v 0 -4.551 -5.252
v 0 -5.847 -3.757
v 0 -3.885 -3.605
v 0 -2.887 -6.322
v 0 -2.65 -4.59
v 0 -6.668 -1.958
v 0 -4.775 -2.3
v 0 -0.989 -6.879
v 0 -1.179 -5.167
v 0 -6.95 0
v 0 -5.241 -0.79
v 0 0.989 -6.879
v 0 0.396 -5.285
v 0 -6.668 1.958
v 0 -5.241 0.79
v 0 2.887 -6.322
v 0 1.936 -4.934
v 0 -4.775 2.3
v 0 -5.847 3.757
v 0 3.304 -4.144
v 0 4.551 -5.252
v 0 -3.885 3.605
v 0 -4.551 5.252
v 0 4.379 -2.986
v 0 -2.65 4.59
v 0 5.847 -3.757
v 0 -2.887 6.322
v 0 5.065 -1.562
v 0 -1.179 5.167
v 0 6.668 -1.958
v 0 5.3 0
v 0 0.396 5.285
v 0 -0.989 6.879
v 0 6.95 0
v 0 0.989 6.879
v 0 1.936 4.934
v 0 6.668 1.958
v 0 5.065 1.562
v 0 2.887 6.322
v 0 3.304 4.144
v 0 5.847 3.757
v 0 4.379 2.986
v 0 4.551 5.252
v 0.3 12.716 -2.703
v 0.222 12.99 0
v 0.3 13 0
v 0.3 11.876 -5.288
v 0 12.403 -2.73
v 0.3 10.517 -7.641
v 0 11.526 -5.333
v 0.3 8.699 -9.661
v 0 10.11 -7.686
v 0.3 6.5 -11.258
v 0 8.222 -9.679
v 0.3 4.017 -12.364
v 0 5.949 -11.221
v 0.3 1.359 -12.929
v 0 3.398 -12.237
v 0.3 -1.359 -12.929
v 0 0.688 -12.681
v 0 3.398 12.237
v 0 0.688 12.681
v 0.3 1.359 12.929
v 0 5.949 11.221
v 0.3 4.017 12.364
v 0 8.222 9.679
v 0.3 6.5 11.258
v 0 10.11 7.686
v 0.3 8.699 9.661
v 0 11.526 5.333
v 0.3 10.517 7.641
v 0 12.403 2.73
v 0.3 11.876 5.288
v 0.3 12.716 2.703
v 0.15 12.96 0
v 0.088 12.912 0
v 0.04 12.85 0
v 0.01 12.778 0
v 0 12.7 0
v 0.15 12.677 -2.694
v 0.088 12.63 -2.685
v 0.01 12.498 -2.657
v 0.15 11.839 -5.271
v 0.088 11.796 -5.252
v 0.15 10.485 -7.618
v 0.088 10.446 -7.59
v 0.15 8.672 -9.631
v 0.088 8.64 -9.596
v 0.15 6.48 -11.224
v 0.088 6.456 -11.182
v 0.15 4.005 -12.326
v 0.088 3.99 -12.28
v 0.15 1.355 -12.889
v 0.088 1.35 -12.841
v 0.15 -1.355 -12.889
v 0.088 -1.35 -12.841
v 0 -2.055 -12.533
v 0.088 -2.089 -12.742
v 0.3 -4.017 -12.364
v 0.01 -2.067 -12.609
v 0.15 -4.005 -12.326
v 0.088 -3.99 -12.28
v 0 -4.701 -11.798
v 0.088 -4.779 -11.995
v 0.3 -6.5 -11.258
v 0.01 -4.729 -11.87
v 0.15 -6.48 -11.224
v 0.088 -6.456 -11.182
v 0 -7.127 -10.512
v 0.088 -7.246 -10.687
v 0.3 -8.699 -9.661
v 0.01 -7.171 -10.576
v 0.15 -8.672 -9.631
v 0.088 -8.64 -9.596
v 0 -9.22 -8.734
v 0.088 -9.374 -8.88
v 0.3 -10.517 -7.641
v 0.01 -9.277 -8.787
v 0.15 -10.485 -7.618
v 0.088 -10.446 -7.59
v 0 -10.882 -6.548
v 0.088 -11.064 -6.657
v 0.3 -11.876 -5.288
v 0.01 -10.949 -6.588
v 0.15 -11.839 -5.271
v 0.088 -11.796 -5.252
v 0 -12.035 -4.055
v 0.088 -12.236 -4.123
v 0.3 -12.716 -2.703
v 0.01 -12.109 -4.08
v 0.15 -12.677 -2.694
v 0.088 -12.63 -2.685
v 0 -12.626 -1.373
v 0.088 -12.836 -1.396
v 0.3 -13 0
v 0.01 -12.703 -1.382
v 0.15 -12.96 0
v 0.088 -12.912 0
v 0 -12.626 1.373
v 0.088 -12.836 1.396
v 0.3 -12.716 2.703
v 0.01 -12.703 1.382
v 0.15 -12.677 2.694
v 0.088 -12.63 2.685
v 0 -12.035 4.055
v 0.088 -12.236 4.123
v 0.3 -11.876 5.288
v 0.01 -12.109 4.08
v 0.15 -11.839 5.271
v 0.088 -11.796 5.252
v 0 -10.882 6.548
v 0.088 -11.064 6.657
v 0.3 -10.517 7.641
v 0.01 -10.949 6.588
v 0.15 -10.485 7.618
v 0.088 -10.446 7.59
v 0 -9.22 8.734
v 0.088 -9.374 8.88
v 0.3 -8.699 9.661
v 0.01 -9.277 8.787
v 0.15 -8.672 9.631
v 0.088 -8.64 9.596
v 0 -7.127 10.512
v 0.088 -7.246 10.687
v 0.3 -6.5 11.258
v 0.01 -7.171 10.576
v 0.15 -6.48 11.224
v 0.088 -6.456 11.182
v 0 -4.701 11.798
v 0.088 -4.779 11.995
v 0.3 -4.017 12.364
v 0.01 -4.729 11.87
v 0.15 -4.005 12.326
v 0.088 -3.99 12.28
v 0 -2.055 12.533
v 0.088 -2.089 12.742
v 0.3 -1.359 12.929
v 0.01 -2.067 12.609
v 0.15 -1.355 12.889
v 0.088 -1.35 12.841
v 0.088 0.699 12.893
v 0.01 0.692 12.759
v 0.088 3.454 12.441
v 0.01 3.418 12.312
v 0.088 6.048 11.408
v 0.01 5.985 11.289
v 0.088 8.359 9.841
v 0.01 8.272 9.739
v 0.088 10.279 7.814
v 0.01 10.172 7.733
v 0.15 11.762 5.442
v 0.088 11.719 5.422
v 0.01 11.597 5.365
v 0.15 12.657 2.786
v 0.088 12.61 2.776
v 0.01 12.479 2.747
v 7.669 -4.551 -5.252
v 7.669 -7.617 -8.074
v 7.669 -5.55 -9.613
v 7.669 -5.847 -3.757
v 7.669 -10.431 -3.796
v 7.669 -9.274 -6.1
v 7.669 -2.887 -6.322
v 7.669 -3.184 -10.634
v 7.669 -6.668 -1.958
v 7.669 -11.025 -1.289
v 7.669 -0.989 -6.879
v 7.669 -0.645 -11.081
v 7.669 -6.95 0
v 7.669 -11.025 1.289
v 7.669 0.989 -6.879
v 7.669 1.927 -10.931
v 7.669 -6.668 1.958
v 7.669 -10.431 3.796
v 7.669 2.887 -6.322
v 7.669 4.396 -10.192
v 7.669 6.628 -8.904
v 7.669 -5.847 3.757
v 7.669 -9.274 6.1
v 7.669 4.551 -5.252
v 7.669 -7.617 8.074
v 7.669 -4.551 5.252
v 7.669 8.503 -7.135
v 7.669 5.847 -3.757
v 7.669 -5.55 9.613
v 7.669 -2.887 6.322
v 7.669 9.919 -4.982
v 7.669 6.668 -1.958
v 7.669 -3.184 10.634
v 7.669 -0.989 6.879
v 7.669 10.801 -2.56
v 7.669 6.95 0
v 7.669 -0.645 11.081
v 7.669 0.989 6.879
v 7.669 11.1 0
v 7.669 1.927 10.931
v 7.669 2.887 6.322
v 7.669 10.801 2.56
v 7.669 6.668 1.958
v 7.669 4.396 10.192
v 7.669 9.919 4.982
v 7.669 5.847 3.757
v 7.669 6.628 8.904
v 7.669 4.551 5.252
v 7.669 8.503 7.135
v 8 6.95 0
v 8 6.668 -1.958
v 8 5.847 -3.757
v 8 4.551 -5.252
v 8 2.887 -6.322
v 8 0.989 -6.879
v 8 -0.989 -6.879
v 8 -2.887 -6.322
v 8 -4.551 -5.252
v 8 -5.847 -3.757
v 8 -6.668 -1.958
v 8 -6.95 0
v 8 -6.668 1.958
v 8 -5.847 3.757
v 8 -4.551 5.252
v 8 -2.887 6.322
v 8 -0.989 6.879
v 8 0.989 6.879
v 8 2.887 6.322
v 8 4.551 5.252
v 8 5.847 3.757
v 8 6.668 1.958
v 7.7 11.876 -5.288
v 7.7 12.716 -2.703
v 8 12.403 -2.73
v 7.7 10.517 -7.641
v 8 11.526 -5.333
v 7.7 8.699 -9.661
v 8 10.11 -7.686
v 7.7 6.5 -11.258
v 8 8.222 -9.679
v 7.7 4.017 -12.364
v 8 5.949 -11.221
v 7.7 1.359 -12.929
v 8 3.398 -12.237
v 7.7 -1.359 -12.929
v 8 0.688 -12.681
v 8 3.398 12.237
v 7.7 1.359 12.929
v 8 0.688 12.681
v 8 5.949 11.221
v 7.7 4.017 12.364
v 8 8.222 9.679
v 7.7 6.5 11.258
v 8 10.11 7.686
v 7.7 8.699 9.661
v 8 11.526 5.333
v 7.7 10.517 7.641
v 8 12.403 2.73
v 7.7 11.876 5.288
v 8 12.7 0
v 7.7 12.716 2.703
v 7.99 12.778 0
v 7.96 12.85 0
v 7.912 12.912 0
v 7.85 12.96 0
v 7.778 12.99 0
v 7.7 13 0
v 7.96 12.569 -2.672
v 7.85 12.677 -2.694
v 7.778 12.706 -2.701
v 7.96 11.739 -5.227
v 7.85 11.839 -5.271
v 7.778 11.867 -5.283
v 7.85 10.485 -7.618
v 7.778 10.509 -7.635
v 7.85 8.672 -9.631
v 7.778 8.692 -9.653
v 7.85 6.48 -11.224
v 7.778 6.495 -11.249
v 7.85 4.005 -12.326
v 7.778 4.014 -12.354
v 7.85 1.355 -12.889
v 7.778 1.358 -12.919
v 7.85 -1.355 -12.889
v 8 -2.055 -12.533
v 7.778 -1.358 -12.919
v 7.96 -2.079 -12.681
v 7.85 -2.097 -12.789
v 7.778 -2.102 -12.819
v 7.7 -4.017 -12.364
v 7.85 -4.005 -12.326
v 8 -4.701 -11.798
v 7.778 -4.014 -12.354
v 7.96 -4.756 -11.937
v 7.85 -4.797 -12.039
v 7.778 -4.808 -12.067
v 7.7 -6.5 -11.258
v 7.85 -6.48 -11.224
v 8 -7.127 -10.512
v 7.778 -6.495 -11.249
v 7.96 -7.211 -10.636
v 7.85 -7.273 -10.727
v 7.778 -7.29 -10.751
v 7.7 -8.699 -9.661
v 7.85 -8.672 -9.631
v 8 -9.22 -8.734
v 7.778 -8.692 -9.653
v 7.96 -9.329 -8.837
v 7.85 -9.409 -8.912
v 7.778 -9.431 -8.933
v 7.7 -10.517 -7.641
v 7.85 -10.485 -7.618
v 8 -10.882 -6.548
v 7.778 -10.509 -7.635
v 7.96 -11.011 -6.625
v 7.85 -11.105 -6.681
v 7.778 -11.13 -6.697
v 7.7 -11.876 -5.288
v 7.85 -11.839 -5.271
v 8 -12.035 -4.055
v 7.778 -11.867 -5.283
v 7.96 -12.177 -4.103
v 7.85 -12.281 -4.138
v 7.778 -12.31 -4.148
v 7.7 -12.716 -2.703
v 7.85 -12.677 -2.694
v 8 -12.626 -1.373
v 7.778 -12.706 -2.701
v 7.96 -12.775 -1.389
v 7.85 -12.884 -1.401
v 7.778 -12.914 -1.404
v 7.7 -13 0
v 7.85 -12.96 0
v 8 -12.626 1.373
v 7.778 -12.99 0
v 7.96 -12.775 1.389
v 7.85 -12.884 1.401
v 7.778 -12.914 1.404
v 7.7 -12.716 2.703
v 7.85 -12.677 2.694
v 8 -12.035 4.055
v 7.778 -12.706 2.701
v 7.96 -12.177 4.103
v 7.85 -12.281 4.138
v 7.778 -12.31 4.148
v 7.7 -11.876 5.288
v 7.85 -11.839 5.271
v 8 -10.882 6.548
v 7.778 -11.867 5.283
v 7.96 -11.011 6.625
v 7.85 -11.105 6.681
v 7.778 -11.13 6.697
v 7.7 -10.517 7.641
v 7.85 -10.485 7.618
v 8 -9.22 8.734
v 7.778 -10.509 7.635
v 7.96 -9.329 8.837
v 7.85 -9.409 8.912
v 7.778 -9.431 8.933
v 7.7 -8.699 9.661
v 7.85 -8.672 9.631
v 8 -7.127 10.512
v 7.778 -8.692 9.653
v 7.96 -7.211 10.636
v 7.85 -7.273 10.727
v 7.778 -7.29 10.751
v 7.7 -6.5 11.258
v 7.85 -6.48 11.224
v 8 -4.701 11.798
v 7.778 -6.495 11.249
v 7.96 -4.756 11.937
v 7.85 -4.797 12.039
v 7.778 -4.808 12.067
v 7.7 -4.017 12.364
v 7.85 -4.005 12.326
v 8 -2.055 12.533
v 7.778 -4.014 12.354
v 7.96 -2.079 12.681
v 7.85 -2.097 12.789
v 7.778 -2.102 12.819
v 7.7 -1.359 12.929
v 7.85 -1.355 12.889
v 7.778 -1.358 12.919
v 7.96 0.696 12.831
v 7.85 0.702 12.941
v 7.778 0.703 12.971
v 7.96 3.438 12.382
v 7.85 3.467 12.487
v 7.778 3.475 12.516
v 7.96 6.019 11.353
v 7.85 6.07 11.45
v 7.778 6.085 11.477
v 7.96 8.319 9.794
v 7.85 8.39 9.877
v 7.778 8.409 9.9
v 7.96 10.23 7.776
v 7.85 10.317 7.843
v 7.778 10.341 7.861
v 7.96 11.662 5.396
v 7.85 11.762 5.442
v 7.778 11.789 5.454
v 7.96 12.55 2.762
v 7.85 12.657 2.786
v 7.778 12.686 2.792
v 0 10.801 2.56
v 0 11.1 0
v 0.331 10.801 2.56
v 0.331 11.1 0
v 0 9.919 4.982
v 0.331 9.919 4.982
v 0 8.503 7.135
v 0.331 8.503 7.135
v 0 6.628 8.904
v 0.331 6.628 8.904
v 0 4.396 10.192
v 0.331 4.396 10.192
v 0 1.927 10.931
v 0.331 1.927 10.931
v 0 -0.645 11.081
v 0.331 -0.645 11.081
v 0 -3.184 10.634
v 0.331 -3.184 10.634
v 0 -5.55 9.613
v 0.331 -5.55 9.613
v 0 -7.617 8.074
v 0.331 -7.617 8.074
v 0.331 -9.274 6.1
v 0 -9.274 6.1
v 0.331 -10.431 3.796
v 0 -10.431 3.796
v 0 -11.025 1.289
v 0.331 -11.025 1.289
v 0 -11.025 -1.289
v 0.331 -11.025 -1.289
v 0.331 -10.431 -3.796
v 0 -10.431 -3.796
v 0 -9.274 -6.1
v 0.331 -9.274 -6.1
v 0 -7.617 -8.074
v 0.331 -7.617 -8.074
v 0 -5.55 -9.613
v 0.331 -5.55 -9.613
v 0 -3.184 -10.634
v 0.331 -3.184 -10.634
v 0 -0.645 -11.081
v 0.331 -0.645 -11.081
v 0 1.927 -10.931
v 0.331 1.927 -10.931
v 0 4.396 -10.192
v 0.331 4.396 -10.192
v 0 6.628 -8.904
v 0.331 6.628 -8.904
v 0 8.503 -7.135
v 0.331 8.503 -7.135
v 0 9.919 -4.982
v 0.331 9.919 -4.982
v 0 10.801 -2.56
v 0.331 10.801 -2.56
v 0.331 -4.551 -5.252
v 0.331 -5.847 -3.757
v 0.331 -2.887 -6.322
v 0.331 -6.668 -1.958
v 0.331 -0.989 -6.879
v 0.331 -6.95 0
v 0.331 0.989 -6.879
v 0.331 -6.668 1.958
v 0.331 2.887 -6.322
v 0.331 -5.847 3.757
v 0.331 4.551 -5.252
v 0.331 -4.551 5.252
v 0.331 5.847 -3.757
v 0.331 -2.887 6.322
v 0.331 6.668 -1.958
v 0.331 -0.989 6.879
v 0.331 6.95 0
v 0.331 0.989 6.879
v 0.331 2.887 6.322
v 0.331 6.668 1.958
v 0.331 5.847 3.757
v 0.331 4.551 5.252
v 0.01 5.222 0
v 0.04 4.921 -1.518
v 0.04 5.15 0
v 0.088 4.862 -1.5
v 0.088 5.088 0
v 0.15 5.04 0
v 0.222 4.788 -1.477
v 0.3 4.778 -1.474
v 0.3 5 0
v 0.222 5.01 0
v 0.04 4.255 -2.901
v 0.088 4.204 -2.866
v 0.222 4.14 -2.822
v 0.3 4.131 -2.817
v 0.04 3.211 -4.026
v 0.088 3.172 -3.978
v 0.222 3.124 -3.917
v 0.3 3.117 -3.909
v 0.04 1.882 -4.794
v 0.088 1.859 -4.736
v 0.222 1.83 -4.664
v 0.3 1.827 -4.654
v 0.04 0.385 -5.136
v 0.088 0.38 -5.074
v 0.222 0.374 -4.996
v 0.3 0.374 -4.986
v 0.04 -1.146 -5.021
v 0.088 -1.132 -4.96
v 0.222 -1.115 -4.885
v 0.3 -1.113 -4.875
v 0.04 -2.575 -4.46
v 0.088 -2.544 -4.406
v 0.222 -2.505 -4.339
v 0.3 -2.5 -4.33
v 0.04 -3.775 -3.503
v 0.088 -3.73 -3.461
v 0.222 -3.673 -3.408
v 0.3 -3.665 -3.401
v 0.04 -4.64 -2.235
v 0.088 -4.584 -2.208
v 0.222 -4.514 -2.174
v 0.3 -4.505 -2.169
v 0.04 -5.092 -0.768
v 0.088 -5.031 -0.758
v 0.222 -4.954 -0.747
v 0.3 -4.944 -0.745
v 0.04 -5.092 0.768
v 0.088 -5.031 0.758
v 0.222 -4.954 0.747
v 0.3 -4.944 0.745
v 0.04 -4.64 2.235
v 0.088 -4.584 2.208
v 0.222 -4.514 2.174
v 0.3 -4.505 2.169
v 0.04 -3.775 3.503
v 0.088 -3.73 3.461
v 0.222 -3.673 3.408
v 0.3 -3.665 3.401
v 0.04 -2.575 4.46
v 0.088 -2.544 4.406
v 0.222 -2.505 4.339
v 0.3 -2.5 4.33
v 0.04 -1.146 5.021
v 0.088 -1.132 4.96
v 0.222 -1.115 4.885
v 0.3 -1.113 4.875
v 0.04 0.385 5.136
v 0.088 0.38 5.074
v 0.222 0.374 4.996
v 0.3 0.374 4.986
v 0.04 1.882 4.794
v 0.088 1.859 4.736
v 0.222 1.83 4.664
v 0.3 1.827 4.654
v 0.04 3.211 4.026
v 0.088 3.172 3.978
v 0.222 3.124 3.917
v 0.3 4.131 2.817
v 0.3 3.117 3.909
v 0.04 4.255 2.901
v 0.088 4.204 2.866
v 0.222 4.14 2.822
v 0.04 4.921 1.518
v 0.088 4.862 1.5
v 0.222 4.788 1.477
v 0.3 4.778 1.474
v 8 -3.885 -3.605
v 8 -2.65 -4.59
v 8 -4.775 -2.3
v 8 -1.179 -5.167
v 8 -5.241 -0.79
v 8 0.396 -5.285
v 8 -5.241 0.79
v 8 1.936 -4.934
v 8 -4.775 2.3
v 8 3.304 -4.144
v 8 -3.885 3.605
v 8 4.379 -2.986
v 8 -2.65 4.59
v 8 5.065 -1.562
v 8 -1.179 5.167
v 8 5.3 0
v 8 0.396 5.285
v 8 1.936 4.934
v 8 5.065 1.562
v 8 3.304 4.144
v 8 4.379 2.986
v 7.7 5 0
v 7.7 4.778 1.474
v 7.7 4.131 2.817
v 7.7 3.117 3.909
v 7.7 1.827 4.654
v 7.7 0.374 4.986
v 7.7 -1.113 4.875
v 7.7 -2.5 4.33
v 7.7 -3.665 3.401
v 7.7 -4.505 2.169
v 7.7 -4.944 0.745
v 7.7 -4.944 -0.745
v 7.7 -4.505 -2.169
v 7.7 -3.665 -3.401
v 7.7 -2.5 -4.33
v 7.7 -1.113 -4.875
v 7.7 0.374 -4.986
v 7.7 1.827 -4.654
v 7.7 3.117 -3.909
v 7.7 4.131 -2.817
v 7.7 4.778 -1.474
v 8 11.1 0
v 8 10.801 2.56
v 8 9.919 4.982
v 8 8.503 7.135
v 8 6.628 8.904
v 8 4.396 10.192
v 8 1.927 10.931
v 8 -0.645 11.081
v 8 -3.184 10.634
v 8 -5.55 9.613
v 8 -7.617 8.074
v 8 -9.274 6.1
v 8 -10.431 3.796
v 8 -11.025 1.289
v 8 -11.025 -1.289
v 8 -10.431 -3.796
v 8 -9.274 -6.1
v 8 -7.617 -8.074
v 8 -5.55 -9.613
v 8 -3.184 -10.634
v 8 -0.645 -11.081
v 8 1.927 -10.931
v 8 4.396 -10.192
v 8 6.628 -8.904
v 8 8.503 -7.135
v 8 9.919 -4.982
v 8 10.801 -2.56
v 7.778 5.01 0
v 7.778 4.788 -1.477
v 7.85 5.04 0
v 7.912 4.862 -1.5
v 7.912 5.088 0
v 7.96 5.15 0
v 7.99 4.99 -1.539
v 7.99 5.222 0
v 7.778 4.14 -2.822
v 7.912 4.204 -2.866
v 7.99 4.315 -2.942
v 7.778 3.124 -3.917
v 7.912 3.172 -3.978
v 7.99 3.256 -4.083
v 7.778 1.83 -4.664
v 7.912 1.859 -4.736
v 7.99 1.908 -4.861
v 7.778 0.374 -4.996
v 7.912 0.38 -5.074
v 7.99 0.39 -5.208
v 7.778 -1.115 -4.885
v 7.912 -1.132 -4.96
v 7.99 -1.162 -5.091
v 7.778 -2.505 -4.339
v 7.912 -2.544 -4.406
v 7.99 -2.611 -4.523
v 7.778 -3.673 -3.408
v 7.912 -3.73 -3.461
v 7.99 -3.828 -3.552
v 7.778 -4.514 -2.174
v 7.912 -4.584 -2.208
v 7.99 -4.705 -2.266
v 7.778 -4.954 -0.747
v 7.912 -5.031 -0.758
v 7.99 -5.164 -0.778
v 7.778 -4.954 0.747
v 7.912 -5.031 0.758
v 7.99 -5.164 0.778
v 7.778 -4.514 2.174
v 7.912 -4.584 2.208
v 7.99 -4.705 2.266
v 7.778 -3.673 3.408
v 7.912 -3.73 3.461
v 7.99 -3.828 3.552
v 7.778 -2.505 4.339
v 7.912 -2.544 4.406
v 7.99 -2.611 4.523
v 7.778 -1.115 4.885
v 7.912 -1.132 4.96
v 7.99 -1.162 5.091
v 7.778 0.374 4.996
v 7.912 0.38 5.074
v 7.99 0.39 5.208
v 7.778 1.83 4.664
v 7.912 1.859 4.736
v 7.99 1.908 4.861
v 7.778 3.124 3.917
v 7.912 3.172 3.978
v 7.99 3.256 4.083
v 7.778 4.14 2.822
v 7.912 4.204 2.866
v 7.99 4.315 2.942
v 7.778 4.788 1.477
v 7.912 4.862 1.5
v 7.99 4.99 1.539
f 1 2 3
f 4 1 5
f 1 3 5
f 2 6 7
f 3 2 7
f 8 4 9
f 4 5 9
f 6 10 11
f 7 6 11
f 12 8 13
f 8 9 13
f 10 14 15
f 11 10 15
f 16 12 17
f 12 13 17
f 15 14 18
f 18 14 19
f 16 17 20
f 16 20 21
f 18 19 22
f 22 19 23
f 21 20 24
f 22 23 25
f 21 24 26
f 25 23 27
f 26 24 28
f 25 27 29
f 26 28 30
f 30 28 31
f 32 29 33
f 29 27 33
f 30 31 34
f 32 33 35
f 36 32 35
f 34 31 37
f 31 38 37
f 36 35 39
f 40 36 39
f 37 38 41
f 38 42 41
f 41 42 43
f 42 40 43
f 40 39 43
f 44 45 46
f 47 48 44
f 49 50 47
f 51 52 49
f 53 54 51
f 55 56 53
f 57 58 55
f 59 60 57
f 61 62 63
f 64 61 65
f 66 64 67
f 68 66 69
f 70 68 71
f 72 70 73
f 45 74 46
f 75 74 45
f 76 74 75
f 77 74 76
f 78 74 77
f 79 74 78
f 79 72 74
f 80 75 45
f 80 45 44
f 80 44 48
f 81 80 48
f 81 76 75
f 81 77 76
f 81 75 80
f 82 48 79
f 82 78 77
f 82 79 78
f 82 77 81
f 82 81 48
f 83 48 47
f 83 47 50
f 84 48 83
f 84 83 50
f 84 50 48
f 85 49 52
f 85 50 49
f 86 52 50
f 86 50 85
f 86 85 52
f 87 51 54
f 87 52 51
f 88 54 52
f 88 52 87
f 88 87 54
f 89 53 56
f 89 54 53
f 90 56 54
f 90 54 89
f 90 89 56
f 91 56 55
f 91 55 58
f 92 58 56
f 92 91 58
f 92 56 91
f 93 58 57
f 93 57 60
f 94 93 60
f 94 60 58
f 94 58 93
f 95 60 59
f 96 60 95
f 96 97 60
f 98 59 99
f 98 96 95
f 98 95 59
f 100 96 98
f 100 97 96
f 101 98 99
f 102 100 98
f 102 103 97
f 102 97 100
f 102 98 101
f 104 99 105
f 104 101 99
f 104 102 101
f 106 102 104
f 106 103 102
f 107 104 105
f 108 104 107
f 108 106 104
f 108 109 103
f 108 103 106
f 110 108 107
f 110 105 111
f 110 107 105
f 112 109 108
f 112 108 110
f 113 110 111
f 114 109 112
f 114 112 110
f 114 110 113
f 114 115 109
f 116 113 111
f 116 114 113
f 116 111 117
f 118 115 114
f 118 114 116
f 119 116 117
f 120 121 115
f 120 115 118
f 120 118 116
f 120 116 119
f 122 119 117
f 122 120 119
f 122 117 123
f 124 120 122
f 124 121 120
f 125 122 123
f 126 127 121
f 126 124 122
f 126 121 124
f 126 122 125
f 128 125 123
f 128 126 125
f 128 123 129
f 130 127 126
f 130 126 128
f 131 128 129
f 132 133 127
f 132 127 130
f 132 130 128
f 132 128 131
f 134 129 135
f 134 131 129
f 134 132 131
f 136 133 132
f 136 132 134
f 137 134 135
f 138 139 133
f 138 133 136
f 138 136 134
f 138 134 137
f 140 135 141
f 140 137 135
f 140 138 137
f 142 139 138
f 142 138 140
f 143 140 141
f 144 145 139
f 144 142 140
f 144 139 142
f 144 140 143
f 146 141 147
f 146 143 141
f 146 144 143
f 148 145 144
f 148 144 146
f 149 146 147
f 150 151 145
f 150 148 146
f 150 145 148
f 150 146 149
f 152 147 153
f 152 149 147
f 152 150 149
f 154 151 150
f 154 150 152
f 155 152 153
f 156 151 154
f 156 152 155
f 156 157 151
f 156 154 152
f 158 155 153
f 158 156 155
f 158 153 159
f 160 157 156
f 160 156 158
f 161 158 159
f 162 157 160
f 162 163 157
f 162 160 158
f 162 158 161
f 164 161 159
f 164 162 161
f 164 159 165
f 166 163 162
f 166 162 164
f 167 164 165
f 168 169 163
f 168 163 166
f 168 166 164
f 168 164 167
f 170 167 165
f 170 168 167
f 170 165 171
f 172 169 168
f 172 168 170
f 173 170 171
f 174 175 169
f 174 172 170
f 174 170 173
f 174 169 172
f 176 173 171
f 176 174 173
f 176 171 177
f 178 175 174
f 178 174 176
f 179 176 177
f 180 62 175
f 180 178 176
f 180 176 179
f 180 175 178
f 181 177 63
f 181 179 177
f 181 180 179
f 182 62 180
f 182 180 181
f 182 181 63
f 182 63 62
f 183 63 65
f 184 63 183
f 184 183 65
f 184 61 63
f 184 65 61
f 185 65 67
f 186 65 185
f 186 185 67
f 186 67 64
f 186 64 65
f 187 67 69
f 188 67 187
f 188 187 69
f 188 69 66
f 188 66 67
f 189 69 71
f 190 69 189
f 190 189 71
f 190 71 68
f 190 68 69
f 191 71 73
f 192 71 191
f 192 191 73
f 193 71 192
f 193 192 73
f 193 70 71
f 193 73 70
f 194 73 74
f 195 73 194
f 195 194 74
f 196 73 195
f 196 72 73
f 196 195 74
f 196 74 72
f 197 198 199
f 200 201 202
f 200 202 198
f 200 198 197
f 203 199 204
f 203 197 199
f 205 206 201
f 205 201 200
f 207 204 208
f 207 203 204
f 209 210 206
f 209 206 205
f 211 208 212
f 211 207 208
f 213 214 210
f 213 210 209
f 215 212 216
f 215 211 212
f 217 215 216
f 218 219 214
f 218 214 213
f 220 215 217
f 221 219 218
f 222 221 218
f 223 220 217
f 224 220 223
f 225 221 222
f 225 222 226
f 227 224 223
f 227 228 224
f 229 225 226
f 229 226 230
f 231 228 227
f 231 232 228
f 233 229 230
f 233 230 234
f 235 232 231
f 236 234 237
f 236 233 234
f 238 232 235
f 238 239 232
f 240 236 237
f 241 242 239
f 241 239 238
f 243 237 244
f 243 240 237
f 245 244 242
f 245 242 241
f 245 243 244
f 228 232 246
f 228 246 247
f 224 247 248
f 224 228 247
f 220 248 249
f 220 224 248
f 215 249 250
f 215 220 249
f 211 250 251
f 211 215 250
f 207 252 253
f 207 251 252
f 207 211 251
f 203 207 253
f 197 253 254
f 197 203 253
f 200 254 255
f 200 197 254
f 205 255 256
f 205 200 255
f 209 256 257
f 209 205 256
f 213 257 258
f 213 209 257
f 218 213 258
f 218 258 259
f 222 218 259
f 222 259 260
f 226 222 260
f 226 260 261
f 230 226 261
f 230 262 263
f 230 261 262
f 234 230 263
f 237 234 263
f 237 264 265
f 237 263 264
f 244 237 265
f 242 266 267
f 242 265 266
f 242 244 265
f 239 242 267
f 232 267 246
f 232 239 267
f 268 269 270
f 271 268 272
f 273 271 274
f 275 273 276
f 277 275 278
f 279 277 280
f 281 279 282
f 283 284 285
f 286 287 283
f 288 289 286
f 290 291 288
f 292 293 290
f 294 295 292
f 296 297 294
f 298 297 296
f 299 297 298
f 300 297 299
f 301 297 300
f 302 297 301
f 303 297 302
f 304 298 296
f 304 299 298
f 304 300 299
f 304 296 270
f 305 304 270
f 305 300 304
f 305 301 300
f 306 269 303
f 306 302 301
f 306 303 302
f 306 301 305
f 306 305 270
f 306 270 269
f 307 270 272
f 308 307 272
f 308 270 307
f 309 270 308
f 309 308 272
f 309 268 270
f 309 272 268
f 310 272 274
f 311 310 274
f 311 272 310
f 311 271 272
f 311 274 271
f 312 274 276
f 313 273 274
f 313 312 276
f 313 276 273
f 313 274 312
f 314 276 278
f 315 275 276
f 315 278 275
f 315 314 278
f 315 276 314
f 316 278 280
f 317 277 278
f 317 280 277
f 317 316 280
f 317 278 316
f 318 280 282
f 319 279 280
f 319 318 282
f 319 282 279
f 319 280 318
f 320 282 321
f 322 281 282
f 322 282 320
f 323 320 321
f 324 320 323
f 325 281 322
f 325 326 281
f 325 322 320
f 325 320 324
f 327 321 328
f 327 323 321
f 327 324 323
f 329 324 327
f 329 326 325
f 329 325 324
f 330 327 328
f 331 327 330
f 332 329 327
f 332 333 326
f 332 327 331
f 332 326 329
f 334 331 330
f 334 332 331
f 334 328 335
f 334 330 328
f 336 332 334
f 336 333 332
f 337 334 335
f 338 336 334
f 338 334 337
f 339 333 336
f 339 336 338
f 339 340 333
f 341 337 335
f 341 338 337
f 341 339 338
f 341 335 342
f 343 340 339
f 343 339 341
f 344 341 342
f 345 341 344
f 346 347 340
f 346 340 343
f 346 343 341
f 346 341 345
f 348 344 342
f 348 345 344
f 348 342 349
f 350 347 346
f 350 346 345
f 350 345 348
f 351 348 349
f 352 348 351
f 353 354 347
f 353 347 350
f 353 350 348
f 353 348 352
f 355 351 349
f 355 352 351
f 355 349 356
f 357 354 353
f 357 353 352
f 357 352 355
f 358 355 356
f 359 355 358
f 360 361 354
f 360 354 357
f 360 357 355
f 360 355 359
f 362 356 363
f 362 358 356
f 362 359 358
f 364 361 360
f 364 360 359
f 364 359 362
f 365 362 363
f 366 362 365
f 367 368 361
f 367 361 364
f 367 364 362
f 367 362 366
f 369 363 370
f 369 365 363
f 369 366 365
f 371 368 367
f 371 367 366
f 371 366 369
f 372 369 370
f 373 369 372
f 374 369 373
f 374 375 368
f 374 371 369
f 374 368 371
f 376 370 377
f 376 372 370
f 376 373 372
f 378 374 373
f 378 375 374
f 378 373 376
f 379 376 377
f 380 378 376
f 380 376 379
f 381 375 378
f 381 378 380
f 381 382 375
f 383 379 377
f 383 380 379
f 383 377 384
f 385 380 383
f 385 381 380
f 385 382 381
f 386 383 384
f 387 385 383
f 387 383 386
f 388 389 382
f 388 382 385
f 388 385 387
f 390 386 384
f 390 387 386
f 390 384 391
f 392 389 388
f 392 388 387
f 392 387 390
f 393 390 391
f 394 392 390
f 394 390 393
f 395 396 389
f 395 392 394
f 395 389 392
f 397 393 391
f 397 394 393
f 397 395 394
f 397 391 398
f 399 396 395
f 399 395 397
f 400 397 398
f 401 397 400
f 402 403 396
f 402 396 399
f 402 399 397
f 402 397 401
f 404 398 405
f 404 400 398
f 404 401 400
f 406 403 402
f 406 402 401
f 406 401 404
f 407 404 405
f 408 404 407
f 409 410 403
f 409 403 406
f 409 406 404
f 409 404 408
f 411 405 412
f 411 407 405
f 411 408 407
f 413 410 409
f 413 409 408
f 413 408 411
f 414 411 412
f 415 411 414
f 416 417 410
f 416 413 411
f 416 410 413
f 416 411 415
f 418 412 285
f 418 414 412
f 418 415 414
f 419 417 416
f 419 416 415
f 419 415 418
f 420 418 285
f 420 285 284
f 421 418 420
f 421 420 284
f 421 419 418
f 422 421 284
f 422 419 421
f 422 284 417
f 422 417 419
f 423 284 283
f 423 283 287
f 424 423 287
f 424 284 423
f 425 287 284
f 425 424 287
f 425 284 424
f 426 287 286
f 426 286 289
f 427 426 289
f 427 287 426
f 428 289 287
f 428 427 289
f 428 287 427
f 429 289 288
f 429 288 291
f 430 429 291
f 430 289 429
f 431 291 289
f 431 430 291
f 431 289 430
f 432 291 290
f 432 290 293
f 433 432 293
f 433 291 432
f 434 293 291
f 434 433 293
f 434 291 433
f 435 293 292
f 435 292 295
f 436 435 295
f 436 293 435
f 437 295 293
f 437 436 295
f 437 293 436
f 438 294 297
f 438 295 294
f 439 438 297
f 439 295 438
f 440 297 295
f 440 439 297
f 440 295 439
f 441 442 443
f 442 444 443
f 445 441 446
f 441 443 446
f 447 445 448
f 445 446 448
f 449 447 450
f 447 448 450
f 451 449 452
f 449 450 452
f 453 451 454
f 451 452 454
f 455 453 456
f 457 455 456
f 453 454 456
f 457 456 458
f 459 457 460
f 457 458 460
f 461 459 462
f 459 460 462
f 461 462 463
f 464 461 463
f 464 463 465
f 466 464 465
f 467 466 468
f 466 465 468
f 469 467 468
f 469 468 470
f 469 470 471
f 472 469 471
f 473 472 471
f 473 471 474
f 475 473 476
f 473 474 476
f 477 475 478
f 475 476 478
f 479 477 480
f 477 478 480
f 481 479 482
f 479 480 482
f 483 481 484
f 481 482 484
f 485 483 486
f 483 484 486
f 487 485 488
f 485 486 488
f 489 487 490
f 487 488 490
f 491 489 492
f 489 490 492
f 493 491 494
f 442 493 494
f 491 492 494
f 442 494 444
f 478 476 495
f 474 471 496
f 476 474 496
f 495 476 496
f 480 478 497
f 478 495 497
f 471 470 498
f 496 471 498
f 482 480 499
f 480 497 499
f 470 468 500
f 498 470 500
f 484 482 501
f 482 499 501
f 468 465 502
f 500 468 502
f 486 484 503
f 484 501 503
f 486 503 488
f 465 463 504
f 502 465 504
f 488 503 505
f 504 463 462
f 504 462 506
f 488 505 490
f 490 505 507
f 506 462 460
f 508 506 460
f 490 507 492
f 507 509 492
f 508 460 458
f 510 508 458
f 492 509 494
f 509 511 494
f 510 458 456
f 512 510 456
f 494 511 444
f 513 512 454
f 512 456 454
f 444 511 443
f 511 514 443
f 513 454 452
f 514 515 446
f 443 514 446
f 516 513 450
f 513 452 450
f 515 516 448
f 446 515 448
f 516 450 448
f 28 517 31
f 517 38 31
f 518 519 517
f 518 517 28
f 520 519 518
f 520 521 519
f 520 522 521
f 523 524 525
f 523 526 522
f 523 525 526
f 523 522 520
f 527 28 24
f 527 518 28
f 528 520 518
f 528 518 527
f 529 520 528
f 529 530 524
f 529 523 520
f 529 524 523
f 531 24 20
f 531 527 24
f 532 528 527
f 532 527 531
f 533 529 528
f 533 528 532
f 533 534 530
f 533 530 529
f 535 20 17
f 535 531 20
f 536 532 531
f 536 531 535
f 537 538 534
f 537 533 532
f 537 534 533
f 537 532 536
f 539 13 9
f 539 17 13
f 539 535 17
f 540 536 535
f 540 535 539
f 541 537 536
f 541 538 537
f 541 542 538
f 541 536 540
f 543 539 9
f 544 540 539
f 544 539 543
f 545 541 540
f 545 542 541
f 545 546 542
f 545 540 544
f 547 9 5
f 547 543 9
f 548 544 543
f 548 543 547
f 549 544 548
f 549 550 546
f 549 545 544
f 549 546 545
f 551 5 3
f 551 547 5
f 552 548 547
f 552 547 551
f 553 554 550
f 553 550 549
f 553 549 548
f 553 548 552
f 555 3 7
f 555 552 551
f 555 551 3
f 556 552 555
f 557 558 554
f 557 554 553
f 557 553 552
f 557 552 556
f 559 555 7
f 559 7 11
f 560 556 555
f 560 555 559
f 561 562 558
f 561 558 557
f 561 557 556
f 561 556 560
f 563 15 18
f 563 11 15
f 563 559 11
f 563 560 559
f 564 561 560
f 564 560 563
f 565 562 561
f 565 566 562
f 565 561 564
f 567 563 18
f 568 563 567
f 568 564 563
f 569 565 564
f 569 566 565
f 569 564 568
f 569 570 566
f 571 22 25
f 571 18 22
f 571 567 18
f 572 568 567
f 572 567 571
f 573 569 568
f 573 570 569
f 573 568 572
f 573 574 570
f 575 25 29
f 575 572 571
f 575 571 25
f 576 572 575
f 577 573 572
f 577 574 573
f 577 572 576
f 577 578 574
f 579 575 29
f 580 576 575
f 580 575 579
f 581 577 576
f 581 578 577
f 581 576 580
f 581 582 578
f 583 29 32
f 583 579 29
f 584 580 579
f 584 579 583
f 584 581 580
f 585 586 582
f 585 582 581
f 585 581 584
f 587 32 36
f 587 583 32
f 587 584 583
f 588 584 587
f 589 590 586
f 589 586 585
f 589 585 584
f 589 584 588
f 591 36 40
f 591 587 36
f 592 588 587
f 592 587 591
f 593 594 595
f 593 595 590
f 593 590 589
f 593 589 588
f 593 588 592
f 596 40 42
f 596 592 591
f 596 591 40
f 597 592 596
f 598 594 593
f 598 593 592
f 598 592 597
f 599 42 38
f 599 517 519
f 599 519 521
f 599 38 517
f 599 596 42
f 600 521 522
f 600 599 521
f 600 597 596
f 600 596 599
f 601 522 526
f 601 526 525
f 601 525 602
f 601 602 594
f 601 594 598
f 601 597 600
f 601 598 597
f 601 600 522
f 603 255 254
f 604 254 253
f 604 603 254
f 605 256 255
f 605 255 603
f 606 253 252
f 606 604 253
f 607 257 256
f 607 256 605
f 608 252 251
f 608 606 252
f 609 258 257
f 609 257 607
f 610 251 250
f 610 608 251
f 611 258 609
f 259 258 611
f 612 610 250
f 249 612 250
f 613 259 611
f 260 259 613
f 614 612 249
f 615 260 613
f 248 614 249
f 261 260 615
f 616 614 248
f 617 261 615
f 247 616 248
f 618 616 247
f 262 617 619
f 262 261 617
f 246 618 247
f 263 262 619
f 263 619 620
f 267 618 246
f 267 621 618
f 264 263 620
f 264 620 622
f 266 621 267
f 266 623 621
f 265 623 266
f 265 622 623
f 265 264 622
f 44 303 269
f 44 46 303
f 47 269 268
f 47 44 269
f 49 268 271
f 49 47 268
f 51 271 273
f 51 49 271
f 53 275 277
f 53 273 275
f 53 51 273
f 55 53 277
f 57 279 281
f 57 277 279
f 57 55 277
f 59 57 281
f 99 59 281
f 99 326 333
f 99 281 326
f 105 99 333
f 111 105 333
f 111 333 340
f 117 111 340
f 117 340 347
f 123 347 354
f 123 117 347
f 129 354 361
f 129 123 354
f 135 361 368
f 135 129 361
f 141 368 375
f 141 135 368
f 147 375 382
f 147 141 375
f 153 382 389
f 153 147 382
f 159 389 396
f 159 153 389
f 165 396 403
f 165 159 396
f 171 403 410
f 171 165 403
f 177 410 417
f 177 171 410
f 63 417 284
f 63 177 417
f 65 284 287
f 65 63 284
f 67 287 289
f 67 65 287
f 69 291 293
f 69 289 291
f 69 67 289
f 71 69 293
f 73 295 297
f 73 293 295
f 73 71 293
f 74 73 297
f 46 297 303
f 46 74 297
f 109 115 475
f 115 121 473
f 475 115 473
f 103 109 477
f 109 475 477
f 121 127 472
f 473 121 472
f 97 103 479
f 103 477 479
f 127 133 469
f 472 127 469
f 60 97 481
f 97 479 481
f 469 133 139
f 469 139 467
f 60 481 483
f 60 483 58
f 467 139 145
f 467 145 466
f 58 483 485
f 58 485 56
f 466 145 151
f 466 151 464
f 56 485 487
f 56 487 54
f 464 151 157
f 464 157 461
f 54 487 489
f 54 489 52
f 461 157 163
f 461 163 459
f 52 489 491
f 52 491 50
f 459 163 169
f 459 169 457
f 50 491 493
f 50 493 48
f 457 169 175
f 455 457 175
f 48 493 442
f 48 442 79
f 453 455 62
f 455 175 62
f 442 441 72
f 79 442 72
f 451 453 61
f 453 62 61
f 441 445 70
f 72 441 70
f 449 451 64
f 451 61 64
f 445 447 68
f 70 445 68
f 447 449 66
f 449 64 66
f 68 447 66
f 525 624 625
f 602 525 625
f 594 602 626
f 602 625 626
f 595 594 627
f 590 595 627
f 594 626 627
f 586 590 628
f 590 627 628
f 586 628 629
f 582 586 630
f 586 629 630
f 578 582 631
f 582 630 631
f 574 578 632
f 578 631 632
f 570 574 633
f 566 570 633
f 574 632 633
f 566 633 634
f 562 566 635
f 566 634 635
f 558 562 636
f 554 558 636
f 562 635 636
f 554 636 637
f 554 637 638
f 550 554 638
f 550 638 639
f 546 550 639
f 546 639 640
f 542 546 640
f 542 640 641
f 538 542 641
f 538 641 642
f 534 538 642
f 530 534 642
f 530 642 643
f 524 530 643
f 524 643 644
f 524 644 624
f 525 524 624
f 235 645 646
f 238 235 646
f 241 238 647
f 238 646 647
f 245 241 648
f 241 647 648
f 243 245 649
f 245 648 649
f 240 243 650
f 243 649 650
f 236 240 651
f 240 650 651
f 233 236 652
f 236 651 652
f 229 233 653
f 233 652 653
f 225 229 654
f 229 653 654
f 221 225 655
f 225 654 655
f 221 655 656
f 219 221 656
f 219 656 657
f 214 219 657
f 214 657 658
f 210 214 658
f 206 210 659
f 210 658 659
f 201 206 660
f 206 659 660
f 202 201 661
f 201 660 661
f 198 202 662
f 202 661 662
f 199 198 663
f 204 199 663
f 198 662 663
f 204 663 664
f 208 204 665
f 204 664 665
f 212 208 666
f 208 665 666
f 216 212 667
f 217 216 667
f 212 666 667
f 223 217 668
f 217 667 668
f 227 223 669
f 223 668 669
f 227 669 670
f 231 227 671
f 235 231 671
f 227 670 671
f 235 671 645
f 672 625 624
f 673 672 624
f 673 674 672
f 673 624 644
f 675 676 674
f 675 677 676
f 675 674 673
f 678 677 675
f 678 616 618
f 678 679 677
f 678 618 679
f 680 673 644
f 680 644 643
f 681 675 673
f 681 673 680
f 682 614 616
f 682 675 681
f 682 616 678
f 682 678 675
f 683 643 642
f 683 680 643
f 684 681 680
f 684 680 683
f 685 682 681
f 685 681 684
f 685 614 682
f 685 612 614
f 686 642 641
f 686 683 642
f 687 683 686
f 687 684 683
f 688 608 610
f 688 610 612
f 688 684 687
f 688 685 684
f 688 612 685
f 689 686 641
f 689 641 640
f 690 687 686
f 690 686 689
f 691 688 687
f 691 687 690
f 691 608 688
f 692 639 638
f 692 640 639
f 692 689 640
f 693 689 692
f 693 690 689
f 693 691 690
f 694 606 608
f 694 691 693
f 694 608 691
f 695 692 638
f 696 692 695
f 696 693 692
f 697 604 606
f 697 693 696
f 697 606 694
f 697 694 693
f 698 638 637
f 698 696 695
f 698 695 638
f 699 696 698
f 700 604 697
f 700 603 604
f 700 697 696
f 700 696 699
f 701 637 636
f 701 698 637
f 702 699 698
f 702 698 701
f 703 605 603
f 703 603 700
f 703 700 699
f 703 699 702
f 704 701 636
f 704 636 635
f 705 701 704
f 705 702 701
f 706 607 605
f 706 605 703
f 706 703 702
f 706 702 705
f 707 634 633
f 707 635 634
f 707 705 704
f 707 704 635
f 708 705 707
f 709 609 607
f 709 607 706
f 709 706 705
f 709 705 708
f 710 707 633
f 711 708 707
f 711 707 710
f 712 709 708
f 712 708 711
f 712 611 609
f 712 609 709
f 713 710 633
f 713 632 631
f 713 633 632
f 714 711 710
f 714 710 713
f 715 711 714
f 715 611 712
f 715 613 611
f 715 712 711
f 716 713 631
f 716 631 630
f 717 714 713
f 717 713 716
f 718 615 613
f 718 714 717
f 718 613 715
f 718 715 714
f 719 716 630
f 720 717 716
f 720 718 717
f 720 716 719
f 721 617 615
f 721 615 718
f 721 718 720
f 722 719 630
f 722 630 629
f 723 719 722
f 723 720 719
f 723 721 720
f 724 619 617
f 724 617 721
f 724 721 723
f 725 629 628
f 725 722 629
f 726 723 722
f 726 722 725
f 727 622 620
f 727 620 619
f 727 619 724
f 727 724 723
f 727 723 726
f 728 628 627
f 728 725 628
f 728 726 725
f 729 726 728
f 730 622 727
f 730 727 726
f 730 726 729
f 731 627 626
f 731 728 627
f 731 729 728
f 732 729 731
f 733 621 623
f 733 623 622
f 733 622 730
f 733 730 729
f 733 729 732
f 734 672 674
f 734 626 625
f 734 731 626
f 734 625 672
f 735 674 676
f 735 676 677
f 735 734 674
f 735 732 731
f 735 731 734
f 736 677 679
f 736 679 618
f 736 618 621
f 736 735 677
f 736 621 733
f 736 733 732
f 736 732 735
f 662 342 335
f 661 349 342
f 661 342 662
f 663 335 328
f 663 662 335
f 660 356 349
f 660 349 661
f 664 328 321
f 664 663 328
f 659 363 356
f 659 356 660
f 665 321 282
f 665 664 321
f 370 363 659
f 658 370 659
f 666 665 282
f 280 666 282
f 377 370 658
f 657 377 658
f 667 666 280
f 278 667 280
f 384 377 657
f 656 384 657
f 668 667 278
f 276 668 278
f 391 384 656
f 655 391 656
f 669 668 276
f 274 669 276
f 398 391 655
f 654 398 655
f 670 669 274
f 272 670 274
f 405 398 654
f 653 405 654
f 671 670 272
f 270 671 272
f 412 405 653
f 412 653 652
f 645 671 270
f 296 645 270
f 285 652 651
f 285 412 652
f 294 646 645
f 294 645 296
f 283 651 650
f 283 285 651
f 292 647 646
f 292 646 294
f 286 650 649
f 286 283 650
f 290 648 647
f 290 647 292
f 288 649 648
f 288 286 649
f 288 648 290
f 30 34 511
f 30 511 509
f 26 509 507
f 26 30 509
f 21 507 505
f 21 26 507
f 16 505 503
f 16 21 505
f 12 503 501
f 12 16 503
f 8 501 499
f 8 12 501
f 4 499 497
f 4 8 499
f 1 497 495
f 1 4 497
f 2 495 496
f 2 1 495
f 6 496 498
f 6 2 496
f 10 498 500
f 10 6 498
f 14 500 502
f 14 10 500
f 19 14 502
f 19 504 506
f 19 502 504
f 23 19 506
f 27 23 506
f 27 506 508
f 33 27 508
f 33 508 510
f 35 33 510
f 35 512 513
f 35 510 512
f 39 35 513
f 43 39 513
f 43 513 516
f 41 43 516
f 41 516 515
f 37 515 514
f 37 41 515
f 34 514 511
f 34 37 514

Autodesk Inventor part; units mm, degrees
sketch "Sketch_1" plane through (0, 0, 0) normal (0, 0, 1) x (1, 0, 0)
  line L0 (8, 0) -> (0, 0)
  arc A0 (0, 5.3) -> (0.3, 5) centre (0.3, 5.3) ccw
  line L1 (0.3, 5) -> (7.7, 5)
  arc A1 (7.7, 5) -> (8, 5.3) centre (7.7, 5.3) ccw
  line L2 (8, 5.3) -> (8, 6.95)
  line L3 (8, 6.95) -> (7.669, 6.95)
  line L4 (7.669, 6.95) -> (7.669, 11.1)
  line L5 (7.669, 11.1) -> (8, 11.1)
  line L6 (8, 11.1) -> (8, 12.7)
  arc A2 (8, 12.7) -> (7.7, 13) centre (7.7, 12.7) ccw
  line L7 (7.7, 13) -> (0.3, 13)
  arc A3 (0.3, 13) -> (0, 12.7) centre (0.3, 12.7) ccw
  line L8 (0, 12.7) -> (0, 11.1)
  line L9 (0, 11.1) -> (0.331, 11.1)
  line L10 (0.331, 11.1) -> (0.331, 6.95)
  line L11 (0.331, 6.95) -> (0, 6.95)
  line L12 (0, 6.95) -> (0, 5.3)
revolve "Revolution1" add sketch "Sketch_1" angle 360 about axis through (8, 0, 0) along (1, 0, 0)
ref_plane "center_point_XY" through (4, 0, 0) normal (1, 0, 0) x (0, 0, -1)
ref_plane "center_point_YZ" through (4, 0, 0) normal (0, 0, -1) x (0, 1, 0)
ref_plane "center_point_ZX" through (4, 0, 0) normal (0, 1, 0) x (1, 0, 0)
ref_plane "to_housing_XY" through (0, 0, 0) normal (1, 0, 0) x (0, 0, -1)
ref_plane "to_housing_YZ" through (0, 0, 0) normal (0, 0, -1) x (0, 1, 0)
ref_plane "to_housing_ZX" through (0, 0, 0) normal (0, 1, 0) x (1, 0, 0)
ref_plane "to_ring_XY" through (7.338, 0, 0) normal (1, 0, 0) x (0, 0, -1)
ref_plane "to_ring_YZ" through (7.338, 0, 0) normal (0, 0, -1) x (0, 1, 0)
ref_plane "to_ring_ZX" through (7.338, 0, 0) normal (0, 1, 0) x (1, 0, 0)
properties part number "bearing_6000"
